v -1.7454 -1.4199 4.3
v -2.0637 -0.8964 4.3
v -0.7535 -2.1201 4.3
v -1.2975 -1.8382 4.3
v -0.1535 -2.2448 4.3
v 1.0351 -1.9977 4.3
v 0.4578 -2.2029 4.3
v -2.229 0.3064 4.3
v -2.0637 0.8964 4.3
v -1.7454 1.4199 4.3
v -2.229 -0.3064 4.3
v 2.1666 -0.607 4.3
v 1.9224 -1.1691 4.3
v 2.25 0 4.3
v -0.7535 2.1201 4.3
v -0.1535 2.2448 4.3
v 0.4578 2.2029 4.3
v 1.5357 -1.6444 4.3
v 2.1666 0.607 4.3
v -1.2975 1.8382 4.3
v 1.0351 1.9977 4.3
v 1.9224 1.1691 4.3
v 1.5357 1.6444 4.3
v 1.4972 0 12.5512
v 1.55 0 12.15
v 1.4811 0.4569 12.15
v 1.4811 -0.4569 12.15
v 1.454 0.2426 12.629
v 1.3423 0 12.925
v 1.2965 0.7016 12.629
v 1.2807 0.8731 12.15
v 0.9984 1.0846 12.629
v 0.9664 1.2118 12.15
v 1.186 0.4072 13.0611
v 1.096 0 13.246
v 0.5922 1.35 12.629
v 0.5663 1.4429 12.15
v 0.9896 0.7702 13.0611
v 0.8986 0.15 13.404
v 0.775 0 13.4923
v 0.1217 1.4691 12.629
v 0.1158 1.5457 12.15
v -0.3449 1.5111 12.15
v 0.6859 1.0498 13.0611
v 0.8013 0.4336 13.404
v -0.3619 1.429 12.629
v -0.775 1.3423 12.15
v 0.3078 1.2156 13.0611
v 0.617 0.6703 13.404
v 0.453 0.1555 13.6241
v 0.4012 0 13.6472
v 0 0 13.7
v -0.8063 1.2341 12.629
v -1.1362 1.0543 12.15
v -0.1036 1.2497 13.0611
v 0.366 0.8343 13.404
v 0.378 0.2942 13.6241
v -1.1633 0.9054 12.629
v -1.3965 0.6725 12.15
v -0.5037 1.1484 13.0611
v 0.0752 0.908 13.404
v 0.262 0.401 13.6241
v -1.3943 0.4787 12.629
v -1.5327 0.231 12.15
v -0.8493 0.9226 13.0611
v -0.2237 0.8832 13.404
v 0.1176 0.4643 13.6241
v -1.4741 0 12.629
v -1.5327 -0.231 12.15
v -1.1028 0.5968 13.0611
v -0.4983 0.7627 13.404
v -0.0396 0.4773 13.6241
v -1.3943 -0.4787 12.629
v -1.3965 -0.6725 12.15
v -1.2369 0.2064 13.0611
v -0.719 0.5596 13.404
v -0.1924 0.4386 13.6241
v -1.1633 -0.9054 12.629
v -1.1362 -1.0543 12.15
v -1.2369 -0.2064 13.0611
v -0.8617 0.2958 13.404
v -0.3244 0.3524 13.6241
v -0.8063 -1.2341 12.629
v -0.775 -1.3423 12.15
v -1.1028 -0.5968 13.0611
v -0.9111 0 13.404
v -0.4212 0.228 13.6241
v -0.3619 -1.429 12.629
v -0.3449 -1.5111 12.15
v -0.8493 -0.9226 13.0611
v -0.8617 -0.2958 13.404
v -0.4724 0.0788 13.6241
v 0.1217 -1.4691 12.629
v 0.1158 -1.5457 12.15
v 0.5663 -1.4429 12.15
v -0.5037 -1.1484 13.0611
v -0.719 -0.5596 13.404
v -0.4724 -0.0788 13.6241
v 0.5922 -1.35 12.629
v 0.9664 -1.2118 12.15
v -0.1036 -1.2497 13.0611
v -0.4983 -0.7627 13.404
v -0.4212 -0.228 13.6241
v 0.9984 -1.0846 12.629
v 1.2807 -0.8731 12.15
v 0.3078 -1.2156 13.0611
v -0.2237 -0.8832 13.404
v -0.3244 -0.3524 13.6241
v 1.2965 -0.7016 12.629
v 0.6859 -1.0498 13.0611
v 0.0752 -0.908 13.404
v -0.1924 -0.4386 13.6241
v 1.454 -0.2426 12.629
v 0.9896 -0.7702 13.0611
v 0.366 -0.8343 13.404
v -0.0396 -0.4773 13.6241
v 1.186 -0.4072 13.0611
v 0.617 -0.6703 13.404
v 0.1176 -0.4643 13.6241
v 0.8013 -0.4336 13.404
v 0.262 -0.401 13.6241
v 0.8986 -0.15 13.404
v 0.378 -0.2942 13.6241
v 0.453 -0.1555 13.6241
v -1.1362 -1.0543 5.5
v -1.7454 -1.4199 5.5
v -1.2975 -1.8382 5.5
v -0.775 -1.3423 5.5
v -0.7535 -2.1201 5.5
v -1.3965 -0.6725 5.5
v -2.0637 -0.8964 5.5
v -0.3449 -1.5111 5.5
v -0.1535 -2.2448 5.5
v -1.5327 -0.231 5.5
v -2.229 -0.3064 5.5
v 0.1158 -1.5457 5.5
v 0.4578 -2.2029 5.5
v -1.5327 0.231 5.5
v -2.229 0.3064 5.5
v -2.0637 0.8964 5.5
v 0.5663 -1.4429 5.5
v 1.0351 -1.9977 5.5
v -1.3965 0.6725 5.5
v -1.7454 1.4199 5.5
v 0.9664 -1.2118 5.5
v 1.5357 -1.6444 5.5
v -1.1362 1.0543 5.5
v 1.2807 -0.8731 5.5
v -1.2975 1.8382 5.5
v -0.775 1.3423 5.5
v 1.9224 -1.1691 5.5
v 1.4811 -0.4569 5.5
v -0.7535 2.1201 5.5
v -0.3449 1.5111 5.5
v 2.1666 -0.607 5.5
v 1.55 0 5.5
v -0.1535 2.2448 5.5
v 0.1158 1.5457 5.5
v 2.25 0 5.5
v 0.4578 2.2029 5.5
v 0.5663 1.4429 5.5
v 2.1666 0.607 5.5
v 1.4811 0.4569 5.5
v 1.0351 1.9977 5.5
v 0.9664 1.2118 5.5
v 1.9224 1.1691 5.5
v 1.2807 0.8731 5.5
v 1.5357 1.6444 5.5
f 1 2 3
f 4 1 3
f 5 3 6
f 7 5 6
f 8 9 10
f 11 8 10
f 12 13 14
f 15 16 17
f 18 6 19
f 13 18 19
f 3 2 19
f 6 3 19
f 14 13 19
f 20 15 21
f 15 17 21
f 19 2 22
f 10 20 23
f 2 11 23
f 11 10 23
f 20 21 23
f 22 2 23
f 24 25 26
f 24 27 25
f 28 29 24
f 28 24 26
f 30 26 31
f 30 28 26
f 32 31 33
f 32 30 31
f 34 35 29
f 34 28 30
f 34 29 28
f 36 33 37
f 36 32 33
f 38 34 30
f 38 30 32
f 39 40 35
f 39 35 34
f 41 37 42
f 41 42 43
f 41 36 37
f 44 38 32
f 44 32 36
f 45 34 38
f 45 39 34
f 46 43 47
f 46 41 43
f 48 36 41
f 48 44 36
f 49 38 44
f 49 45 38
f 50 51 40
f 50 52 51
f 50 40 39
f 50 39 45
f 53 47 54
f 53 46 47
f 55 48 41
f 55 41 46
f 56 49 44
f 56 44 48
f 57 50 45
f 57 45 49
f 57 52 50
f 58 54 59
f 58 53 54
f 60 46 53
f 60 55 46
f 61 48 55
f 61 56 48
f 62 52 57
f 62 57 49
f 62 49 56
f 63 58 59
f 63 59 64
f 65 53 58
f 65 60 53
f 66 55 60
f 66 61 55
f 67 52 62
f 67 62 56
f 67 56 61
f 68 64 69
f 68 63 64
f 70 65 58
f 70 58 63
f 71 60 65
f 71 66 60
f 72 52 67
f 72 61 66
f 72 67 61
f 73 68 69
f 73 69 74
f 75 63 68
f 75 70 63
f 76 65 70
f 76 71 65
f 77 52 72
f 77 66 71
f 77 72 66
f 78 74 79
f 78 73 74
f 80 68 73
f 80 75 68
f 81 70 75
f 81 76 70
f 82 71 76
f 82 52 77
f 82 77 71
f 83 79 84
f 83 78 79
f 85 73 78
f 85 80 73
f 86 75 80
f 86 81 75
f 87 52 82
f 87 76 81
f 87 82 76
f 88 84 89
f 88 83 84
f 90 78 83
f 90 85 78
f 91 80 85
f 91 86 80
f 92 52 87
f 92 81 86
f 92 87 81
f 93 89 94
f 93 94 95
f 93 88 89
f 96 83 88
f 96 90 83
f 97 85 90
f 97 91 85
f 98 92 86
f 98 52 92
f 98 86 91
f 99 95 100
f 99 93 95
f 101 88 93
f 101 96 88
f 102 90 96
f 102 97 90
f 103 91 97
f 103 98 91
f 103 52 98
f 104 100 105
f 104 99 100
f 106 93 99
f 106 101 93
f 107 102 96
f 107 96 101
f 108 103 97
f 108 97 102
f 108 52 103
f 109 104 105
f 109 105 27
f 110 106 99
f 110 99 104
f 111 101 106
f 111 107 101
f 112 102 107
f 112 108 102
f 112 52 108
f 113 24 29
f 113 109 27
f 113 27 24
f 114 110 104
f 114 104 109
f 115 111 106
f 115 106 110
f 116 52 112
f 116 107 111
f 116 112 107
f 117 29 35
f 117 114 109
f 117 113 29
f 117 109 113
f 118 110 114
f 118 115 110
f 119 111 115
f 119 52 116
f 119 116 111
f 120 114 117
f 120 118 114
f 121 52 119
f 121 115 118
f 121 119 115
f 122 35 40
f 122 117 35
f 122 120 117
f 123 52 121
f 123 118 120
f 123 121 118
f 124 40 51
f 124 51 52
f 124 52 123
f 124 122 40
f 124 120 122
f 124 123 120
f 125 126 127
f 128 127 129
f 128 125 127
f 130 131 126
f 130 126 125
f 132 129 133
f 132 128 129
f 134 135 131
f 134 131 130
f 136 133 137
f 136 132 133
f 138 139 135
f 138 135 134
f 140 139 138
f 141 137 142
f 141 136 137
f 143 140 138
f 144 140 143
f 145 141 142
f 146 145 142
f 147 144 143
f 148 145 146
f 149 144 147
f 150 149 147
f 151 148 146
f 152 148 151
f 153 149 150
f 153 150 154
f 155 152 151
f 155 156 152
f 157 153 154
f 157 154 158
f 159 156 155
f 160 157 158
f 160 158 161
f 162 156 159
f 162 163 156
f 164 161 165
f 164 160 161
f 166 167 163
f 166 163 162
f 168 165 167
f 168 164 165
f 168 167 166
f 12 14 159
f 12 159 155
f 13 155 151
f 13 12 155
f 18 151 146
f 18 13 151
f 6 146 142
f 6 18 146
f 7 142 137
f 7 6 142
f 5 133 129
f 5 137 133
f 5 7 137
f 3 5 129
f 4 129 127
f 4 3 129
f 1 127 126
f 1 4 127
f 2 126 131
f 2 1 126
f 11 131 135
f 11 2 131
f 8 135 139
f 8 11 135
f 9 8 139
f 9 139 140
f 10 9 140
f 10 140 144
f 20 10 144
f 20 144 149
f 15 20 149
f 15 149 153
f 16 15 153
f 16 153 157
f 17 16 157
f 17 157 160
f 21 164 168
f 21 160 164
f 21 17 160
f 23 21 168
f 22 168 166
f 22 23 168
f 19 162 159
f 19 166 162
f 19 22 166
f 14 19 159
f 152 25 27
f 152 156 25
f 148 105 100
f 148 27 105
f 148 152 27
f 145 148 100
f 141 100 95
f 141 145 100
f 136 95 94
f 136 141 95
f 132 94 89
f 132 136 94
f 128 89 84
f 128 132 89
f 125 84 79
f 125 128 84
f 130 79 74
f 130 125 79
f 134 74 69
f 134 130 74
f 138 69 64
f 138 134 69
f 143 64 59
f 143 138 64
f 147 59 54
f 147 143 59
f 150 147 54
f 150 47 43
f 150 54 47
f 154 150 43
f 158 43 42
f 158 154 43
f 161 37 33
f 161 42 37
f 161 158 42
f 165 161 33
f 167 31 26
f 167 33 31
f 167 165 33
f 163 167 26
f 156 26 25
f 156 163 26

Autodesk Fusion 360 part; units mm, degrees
sketch "Esquisse1" plane through (0, 0, 0) normal (0, 0, 1) x (1, 0, 0)
  circle A0 centre (0, 0) radius 1
  dimension "d1" = 2
extrude "Extrusion1" add sketch "Esquisse1" along normal blind 4.3
sketch "Esquisse2" plane through (0, 0, 4.3) normal (0, 0, 1) x (1, 0, 0)
  circle A0 centre (0, 0) radius 1
  circle A1 centre (0, 0) radius 2.25
  dimension "d4" = 4.5
extrude "Extrusion2" add sketch "Esquisse2" along normal blind 1.2 contours A0 | A1
sketch "Esquisse3" plane through (0, 0, 5.5) normal (0, 0, 1) x (1, 0, 0)
  circle A0 centre (0, 0) radius 2.25
  circle A1 centre (0, 0) radius 1.55
  dimension "d7" = 3.1
extrude "Extrusion3" add sketch "Esquisse3" along normal blind 8.7 contours A1
extrude "Extrusion4" cut 1 faces at (-0.3296, 0.5031, 0) along direction (0, 0, 1) blind 4.3
extrude "Extrude5" cut 1 faces at (0.8338, -0.7144, 14.2) along direction (0, 0, -1) blind 0.5
fillet "Fillet2" radius 1.55 1 edges at (-1.4451, 0.5605, 13.7)
